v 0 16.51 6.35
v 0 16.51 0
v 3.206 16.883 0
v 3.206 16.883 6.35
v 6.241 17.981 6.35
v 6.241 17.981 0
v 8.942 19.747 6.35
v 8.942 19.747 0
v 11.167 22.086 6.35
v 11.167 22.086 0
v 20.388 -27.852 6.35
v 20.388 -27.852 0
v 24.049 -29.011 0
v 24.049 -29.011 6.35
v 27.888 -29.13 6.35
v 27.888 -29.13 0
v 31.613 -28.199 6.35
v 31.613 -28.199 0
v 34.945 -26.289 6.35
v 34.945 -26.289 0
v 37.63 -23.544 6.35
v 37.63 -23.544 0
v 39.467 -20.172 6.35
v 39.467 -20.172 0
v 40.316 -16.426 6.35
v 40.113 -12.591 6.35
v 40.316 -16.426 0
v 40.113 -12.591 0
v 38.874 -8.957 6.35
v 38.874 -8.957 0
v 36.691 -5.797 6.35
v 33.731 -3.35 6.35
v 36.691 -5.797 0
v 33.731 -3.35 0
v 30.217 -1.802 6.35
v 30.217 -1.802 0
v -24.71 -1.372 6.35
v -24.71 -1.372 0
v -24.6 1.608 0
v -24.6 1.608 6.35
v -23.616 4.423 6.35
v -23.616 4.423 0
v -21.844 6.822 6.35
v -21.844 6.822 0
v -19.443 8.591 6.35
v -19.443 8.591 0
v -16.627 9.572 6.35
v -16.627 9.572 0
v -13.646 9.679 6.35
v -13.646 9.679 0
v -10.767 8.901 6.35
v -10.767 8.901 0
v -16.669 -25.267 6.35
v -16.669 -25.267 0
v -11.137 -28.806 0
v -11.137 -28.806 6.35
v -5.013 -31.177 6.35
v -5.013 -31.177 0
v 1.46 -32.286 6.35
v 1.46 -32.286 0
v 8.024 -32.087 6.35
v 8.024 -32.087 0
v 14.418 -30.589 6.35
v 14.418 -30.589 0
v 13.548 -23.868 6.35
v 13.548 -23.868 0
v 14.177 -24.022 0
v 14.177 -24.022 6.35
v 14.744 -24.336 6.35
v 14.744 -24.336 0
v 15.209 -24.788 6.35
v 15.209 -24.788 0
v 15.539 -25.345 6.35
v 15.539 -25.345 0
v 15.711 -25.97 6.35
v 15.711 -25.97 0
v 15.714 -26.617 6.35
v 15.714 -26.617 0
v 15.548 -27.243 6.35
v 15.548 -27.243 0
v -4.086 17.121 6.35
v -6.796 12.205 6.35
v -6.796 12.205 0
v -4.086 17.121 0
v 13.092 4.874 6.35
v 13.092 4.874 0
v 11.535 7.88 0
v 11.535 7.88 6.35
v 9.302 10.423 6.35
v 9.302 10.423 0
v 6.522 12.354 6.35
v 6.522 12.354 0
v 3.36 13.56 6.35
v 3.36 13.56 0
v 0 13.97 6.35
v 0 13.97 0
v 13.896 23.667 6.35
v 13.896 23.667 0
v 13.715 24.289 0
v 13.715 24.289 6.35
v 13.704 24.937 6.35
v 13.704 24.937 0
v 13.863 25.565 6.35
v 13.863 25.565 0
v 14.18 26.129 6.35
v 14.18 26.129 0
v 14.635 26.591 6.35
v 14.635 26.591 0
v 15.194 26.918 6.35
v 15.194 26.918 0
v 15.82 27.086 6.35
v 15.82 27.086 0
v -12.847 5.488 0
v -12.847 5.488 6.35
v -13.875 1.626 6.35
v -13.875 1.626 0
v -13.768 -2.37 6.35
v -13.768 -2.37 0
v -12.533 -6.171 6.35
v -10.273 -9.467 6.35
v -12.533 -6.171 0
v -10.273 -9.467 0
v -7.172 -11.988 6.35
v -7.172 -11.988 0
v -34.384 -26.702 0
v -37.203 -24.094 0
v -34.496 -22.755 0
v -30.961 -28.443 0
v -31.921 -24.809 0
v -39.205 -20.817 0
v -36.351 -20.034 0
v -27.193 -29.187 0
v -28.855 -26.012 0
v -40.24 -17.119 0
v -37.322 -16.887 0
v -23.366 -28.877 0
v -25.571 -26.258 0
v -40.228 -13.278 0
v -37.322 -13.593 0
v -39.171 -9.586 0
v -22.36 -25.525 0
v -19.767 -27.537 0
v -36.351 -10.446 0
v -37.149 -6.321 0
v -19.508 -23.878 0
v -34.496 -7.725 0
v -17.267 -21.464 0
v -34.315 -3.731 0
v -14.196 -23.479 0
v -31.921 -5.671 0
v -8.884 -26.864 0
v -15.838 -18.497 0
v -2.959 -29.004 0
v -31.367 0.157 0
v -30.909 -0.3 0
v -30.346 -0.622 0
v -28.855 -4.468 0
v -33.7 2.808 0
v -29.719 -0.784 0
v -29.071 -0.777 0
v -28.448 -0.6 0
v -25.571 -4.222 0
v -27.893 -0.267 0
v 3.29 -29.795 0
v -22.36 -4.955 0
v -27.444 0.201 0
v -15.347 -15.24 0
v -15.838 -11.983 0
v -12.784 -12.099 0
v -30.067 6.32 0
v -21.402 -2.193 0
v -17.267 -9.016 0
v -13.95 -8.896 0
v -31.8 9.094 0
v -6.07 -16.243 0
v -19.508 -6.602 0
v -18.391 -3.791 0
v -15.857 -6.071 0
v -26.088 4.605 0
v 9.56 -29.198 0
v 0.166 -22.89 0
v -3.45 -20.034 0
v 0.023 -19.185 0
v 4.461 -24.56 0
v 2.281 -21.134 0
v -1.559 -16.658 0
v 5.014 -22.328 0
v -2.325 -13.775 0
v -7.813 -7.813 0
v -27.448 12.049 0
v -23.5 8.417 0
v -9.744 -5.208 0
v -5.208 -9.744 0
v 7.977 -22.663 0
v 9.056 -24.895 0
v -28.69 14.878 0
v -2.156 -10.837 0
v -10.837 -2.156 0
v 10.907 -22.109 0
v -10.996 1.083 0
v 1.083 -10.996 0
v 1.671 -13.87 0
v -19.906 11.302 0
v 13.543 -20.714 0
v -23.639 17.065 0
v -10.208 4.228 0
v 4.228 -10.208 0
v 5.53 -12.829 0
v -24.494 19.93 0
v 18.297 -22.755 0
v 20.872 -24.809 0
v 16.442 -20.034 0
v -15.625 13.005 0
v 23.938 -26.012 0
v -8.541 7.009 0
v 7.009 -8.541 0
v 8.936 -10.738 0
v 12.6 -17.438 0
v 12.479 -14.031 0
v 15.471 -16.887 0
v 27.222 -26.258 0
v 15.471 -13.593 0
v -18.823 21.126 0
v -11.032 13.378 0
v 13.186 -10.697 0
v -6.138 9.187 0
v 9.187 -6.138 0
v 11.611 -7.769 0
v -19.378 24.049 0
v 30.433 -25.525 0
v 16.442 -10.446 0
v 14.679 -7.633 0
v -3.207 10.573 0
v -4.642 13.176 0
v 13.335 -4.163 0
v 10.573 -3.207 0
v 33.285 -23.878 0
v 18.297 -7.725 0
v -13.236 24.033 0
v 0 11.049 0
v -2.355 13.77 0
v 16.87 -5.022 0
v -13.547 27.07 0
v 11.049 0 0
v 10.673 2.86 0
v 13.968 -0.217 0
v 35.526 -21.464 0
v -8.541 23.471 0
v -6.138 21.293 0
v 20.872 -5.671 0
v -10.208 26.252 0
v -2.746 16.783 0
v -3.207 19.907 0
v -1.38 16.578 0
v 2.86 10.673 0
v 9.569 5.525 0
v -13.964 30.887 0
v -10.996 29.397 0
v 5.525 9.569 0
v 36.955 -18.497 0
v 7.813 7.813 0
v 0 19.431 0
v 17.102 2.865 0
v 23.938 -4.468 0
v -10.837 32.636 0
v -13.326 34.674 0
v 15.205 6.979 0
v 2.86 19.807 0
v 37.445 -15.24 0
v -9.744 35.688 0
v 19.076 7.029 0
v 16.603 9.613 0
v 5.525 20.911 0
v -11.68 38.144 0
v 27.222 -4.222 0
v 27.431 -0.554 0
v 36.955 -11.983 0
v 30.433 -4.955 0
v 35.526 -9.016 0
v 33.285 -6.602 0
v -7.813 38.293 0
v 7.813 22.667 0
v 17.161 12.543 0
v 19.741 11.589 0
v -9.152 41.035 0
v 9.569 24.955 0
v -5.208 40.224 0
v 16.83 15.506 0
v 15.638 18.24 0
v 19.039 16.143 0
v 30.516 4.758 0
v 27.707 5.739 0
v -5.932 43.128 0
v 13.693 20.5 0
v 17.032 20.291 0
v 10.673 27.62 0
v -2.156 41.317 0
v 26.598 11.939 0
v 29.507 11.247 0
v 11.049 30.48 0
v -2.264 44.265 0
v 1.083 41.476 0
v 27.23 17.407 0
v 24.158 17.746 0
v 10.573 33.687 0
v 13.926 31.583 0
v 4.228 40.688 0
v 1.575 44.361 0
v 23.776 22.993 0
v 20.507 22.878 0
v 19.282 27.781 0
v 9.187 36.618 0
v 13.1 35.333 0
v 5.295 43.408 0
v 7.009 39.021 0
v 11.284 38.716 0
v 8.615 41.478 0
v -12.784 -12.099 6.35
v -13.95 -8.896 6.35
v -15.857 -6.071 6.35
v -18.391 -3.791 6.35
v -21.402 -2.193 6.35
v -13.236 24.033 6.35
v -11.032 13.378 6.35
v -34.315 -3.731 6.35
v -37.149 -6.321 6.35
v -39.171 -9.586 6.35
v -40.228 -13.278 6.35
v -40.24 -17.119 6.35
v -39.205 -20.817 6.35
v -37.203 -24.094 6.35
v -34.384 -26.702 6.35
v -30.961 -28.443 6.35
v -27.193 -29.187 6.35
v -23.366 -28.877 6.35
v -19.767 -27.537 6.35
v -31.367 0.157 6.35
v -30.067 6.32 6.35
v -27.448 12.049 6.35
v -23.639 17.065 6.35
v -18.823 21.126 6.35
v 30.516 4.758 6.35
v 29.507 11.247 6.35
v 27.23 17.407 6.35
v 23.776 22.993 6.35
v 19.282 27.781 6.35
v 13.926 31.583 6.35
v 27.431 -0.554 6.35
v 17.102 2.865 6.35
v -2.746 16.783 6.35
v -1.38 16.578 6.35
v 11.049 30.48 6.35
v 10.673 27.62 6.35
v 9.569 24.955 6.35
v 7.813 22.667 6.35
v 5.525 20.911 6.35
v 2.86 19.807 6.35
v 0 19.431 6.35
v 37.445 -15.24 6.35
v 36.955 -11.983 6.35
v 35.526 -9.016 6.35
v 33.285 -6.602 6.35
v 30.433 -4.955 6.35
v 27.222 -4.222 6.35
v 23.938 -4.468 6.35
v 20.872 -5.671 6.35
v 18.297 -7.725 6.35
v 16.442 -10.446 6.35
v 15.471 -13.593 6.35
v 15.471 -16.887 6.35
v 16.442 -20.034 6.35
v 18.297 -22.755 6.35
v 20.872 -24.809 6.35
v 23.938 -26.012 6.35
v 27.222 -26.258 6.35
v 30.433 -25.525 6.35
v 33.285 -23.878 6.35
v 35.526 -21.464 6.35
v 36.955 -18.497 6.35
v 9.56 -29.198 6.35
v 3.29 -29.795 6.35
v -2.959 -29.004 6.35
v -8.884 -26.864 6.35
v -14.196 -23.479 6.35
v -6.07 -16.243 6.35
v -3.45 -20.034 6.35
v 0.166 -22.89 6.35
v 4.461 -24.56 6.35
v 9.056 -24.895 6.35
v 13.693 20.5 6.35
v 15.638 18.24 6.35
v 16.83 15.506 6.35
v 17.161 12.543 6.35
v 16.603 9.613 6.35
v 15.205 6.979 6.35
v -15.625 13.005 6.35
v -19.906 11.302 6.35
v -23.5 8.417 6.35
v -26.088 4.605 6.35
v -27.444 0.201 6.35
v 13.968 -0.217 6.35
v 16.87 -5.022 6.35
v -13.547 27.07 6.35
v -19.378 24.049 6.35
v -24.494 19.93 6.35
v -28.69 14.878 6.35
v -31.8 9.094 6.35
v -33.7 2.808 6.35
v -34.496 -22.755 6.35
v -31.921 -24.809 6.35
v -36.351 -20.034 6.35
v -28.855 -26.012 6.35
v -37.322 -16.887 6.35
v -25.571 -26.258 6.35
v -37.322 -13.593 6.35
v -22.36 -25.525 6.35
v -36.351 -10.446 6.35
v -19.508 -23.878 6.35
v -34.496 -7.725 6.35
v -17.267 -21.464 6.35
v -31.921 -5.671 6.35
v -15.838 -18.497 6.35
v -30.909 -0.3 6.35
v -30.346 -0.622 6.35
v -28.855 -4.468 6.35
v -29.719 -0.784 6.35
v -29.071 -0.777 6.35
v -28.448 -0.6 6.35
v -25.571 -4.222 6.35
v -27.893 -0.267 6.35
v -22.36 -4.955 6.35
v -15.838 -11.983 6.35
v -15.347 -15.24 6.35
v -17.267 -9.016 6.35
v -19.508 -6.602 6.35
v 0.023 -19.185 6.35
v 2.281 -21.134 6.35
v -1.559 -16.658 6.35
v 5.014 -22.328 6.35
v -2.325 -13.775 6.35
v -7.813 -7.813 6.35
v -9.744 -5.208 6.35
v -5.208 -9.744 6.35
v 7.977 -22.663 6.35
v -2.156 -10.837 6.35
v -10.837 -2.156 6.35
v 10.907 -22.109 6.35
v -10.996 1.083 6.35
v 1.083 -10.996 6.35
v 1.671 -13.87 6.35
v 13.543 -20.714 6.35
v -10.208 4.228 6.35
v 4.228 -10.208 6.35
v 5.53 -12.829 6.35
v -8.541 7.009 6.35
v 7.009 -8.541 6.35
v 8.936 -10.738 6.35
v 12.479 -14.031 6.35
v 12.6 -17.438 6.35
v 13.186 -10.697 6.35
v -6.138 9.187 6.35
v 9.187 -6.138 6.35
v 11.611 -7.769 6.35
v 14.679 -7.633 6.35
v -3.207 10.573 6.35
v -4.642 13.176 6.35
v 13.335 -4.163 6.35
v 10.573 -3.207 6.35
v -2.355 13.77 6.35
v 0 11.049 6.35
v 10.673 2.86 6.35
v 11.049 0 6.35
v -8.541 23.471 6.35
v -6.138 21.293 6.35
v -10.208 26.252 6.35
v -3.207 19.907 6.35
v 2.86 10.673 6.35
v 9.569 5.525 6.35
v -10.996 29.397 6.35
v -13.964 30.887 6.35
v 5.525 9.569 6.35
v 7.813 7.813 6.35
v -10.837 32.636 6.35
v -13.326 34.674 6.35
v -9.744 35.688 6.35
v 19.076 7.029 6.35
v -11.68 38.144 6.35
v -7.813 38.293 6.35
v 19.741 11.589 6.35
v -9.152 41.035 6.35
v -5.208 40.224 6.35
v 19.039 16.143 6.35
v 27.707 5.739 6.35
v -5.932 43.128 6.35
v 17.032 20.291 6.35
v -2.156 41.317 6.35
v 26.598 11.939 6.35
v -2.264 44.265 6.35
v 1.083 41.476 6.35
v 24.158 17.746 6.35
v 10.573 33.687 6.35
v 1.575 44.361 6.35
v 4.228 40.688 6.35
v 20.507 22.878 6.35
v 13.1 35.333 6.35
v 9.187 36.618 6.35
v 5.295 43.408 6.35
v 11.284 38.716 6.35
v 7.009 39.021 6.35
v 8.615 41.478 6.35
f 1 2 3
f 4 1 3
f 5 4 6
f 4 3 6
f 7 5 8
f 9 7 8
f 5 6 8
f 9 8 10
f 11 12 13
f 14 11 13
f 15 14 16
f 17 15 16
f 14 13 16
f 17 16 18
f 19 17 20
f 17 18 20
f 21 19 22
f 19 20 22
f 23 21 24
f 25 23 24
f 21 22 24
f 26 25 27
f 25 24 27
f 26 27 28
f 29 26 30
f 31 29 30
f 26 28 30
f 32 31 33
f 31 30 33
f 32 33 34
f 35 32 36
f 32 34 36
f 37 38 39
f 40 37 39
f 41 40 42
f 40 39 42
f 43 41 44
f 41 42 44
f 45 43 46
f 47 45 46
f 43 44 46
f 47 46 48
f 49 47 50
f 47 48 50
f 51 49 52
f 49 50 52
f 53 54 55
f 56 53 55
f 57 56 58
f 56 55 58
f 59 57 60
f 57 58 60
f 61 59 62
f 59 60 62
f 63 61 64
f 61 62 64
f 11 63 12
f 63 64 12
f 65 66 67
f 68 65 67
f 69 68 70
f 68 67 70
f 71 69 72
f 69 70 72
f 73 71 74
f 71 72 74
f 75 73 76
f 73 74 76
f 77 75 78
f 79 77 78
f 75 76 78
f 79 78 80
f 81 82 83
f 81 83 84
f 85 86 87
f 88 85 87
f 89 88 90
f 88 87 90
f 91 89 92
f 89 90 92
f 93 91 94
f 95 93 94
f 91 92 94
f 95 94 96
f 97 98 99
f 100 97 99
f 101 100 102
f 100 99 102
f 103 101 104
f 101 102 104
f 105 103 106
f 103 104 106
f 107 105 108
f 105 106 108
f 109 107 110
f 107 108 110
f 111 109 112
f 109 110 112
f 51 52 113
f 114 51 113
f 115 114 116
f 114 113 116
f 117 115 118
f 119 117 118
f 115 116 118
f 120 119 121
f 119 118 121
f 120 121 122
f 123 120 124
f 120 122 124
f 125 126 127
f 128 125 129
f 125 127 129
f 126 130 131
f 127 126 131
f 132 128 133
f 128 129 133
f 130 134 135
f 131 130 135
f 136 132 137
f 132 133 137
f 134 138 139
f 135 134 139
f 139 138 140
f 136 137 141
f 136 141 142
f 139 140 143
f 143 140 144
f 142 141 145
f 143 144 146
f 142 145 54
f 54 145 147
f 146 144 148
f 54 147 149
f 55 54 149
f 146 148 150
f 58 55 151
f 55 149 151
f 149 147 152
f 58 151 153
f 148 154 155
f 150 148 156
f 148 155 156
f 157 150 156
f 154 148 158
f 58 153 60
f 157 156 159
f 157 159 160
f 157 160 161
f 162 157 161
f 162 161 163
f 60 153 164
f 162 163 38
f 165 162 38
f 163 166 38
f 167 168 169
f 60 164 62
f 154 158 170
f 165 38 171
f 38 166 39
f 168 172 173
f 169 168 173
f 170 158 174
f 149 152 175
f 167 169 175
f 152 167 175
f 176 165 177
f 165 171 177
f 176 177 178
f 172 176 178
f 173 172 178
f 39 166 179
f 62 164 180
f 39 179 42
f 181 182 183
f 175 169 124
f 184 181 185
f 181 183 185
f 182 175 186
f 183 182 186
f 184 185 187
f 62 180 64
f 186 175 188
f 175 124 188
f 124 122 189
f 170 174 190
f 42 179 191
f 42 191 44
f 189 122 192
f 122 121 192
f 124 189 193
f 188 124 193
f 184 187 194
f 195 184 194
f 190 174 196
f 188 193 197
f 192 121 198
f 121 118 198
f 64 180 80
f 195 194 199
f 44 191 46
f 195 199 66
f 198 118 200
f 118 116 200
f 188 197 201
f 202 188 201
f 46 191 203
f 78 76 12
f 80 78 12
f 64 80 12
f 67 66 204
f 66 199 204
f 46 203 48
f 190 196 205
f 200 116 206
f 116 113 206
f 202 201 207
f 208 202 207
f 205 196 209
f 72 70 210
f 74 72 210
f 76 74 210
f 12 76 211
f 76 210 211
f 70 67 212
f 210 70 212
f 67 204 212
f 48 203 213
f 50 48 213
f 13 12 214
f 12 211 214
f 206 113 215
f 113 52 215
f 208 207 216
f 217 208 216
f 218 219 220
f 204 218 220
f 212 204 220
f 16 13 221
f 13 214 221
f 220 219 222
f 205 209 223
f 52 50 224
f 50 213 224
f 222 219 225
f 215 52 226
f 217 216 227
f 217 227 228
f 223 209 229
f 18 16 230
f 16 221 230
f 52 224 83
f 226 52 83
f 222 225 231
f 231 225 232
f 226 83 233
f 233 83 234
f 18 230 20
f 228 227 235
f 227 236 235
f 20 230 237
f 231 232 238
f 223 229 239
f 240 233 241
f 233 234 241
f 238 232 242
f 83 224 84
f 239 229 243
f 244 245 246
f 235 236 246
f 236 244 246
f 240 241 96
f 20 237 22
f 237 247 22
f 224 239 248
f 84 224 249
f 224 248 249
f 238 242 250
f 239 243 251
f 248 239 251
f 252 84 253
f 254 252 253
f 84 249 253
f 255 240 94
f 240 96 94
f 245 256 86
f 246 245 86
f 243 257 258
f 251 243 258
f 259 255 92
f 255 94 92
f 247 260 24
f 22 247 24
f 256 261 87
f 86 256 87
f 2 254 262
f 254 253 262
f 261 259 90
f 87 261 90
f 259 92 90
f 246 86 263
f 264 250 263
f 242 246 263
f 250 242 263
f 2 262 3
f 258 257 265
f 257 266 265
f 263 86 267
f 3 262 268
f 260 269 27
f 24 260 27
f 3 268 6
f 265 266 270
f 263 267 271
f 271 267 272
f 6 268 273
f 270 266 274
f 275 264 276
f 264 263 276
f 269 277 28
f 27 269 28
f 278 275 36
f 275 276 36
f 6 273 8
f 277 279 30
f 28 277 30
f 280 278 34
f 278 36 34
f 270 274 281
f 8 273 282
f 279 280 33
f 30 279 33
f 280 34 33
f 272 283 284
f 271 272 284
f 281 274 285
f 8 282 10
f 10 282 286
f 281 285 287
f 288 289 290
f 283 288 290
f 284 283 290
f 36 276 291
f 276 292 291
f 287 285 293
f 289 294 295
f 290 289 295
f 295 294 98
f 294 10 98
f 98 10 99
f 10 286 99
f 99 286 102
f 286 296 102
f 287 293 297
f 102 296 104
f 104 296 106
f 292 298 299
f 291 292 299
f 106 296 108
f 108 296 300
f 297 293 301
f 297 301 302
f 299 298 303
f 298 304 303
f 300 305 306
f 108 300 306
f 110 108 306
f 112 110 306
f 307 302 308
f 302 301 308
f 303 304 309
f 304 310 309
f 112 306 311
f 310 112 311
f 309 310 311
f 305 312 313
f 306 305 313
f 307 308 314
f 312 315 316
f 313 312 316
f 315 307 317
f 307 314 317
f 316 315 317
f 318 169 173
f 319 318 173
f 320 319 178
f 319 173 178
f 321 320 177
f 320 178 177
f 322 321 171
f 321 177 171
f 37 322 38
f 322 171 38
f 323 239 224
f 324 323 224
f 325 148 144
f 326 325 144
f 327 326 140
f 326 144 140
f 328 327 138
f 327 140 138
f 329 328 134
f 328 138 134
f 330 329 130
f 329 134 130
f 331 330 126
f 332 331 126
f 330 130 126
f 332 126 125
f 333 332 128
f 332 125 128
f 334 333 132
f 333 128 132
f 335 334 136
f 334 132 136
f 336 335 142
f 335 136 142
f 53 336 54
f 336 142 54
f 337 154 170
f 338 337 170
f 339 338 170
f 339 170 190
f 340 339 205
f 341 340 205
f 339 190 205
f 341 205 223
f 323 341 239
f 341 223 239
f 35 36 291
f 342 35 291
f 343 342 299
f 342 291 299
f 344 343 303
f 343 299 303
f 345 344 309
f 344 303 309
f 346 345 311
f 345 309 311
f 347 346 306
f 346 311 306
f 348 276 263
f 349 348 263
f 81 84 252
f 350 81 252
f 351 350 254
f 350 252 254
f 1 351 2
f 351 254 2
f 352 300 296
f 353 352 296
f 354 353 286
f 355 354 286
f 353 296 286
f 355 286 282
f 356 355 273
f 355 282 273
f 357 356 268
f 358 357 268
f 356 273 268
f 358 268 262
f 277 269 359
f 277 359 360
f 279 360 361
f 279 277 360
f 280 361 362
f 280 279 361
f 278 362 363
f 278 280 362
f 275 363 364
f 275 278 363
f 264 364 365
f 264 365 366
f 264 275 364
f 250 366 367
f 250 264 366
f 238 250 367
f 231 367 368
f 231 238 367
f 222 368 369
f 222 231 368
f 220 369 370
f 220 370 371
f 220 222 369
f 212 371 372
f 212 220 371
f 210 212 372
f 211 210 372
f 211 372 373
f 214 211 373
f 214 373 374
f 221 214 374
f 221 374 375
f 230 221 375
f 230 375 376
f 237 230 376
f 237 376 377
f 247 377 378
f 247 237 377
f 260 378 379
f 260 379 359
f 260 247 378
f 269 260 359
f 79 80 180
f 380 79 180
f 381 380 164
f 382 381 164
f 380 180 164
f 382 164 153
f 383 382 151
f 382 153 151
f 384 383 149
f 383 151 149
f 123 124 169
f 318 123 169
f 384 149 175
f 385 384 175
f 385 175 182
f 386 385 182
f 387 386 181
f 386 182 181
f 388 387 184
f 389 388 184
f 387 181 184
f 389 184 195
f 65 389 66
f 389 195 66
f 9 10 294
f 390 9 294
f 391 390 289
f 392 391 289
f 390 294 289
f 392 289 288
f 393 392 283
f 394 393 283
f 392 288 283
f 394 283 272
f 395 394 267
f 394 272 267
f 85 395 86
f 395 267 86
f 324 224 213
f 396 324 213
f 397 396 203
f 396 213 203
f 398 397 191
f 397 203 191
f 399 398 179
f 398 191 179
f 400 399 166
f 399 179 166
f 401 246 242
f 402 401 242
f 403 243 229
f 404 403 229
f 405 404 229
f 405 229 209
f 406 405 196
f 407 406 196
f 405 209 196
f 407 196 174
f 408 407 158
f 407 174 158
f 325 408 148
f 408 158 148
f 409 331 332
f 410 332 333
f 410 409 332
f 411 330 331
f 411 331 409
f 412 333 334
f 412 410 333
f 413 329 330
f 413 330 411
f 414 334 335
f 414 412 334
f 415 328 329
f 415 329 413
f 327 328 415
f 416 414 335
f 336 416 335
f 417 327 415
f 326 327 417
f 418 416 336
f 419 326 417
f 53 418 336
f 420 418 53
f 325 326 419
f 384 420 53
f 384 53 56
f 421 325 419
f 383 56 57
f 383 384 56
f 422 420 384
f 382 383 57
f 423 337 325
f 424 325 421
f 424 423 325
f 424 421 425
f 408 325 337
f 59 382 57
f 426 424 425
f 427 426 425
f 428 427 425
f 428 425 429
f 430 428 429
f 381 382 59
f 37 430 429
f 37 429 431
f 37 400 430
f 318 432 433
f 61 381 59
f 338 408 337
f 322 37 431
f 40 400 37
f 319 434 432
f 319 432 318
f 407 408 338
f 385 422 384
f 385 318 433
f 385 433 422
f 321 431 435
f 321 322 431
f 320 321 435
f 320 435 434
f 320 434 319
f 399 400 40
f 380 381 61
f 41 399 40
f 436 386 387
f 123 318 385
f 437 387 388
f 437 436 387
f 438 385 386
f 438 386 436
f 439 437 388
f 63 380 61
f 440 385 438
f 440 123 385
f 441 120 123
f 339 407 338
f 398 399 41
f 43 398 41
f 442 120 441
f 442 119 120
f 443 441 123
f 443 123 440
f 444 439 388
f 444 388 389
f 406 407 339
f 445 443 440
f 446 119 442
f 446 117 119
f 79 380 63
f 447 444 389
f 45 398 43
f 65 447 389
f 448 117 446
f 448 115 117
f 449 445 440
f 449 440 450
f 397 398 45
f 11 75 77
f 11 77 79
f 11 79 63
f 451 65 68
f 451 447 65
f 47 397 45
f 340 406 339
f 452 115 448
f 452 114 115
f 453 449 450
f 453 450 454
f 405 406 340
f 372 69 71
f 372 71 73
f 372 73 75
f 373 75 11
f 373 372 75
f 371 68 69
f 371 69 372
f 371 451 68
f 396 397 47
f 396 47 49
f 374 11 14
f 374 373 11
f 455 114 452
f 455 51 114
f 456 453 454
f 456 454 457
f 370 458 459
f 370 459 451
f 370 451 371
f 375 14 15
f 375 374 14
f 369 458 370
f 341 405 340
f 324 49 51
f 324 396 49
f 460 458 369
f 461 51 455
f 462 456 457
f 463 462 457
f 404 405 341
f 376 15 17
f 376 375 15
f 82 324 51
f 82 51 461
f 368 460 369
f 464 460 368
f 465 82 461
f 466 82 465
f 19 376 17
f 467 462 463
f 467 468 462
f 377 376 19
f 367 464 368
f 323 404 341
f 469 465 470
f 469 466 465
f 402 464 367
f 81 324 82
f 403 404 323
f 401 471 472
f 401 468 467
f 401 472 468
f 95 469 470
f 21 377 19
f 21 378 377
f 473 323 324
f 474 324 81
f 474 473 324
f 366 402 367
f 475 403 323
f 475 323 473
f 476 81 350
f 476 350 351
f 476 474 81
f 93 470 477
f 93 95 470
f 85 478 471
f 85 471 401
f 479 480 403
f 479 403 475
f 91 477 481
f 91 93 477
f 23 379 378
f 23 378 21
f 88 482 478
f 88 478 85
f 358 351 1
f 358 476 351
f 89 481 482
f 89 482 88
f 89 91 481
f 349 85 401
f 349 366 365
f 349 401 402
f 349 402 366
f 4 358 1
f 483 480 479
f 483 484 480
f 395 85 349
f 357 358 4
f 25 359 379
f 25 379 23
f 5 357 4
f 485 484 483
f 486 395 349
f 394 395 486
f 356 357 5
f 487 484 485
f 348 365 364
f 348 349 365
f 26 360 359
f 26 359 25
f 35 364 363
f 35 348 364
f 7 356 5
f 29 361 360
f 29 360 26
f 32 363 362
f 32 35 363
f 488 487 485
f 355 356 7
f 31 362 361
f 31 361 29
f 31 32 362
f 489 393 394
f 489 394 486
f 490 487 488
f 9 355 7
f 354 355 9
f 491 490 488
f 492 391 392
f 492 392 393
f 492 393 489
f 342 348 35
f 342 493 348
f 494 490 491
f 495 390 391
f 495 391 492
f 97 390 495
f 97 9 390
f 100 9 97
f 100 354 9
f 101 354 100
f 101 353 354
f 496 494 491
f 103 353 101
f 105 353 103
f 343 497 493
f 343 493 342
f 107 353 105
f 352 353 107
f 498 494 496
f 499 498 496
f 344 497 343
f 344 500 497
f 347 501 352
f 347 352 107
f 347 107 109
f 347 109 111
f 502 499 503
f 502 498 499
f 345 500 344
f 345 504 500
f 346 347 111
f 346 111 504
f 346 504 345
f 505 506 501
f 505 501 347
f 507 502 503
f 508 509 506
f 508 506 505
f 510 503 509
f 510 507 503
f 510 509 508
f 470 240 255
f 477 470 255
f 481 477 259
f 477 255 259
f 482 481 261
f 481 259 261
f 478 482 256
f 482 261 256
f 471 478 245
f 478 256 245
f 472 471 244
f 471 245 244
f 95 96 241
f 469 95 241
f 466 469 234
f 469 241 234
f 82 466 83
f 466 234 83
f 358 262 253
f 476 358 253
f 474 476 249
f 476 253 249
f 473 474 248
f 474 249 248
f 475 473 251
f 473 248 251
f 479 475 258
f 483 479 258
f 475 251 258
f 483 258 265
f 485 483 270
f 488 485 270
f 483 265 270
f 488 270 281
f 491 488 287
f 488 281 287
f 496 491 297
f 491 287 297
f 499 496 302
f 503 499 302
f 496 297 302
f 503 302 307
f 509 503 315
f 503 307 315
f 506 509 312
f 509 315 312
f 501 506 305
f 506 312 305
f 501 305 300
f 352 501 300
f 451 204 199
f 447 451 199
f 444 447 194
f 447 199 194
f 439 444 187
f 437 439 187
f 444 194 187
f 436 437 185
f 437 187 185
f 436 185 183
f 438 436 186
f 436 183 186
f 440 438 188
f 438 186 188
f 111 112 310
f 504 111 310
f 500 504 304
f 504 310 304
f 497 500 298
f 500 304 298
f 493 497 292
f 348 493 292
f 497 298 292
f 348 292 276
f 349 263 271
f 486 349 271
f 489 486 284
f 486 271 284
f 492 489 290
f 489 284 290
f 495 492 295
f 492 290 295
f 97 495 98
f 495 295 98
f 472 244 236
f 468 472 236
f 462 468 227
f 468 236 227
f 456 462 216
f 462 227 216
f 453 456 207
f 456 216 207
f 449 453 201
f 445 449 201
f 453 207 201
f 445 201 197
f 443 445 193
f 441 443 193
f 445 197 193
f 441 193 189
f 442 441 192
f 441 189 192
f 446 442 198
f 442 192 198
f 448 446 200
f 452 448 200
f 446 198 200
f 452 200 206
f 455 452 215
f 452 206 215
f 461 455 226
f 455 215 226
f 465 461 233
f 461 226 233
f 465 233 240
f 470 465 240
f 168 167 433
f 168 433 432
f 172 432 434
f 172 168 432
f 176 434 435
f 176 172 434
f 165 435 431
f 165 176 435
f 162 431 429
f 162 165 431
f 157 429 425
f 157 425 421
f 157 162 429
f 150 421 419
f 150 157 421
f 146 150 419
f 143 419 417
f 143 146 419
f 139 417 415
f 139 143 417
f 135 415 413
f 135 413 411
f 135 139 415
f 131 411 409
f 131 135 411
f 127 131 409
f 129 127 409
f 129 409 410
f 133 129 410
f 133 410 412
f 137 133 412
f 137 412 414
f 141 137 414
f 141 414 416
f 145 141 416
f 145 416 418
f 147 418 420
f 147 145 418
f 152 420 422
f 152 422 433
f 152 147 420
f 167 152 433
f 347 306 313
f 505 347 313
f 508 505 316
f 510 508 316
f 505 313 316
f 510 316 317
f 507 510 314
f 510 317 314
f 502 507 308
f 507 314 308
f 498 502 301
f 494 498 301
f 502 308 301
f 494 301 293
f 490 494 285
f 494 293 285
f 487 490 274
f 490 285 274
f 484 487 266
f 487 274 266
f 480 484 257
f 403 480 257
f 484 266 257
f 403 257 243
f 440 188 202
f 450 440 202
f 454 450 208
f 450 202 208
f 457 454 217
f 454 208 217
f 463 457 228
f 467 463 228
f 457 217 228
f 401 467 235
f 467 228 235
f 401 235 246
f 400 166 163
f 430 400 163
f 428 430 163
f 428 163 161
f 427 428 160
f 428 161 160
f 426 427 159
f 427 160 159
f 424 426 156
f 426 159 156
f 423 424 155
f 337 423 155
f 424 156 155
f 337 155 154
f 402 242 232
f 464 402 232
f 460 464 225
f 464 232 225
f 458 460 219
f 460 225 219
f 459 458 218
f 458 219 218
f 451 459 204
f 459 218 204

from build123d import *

# Parameters (mm, degrees)
F0_R     = 11.049
F1_DEPTH = 6.35


with BuildPart() as f1:
    # F0 (on Top) → F1 (new body)
    with BuildSketch(Plane.XY):
        with BuildLine():
            ThreePointArc((0, 11.049), (-7.812823, -7.812823), (11.049, 0))
            ThreePointArc((11.049, 0), (7.812823, 7.812823), (0, 11.049))
        make_face()
        with BuildLine():
            ThreePointArc((11.049, 30.48), (-7.812823, 38.292823), (0, 19.431))
            ThreePointArc((0, 19.431), (7.812823, 22.667177), (11.049, 30.48))
        make_face()
        with BuildLine():
            ThreePointArc((20.388099, -27.851922), (39.467067, -20.17153), (30.216541, -1.802447))
            ThreePointArc((30.216541, -1.802447), (27.230144, 17.407217), (13.926422, 31.582573))
            ThreePointArc((13.926422, 31.582573), (-2.264476, 44.265247), (-13.547306, 27.069516))
            ThreePointArc((-13.547306, 27.069516), (-28.690164, 14.878388), (-34.314522, -3.730651))
            ThreePointArc((-34.314522, -3.730651), (-37.202591, -24.093718), (-16.669235, -25.267069))
            ThreePointArc((-16.669235, -25.267069), (1.46002, -32.285604), (20.388099, -27.851922))
        make_face()
        with Locations((-26.396454, -15.24)):
            Circle(F0_R, mode=Mode.SUBTRACT)
        with BuildLine():
            ThreePointArc((-24.710147, -1.37215), (-20.709724, 7.796596), (-10.767389, 8.9008))
            ThreePointArc((-10.767389, 8.9008), (-13.767563, -2.369623), (-7.172004, -11.988463))
            Line((-7.172004, -11.988463), (-12.78411, -12.099142))
            ThreePointArc((-12.78411, -12.099142), (-17.054117, -4.853392), (-24.710147, -1.37215))
        make_face(mode=Mode.SUBTRACT)
        with BuildLine():
            ThreePointArc((13.548183, -23.867834), (15.3921, -25.055532), (15.5478, -27.24332))
            ThreePointArc((15.5478, -27.24332), (0.143167, -29.572149), (-14.195671, -23.479213))
            Line((-14.195671, -23.479213), (-6.069518, -16.243227))
            ThreePointArc((-6.069518, -16.243227), (2.250939, -23.885085), (13.548183, -23.867834))
        make_face(mode=Mode.SUBTRACT)
        with Locations((26.396454, -15.24)):
            Circle(F0_R, mode=Mode.SUBTRACT)
        with BuildLine():
            Line((13.968316, -0.216906), (16.870219, -5.021793))
            ThreePointArc((16.870219, -5.021793), (12.730219, -12.342602), (13.54339, -20.71354))
            ThreePointArc((13.54339, -20.71354), (3.602811, -21.833445), (-2.324624, -13.775232))
            ThreePointArc((-2.324624, -13.775232), (8.935935, -10.738248), (13.968316, -0.216906))
        make_face(mode=Mode.SUBTRACT)
        with BuildLine():
            ThreePointArc((0, 11.049), (7.812823, 7.812823), (11.049, 0))
            ThreePointArc((11.049, 0), (-7.812823, -7.812823), (0, 11.049))
        make_face(mode=Mode.SUBTRACT)
        with BuildLine():
            ThreePointArc((-27.444242, 0.200847), (-29.394777, -0.802184), (-31.367307, 0.15687))
            ThreePointArc((-31.367307, 0.15687), (-25.681816, 14.662088), (-13.235759, 24.033418))
            Line((-13.235759, 24.033418), (-11.032288, 13.37797))
            ThreePointArc((-11.032288, 13.37797), (-21.81056, 9.993172), (-27.444242, 0.200847))
        make_face(mode=Mode.SUBTRACT)
        with BuildLine():
            ThreePointArc((13.092013, 4.874432), (7.97073, 11.47294), (0, 13.97))
            ThreePointArc((0, 13.97), (-3.510832, 13.521648), (-6.796312, 12.20537))
            Line((-6.796312, 12.20537), (-4.086109, 17.120935))
            ThreePointArc((-4.086109, 17.120935), (-2.065764, 16.663578), (0, 16.51))
            ThreePointArc((0, 16.51), (6.240688, 17.981412), (11.166757, 22.08569))
            ThreePointArc((11.166757, 22.08569), (17.106913, 14.036849), (13.092013, 4.874432))
        make_face(mode=Mode.SUBTRACT)
        with BuildLine():
            ThreePointArc((13.896059, 23.666987), (14.002677, 25.857716), (15.819507, 27.08645))
            ThreePointArc((15.819507, 27.08645), (25.538649, 14.910061), (27.43143, -0.554205))
            Line((27.43143, -0.554205), (17.101806, 2.865257))
            ThreePointArc((17.101806, 2.865257), (19.559621, 13.891913), (13.896059, 23.666987))
        make_face(mode=Mode.SUBTRACT)
        with BuildLine():
            ThreePointArc((11.049, 30.48), (7.812823, 22.667177), (0, 19.431))
            ThreePointArc((0, 19.431), (-7.812823, 38.292823), (11.049, 30.48))
        make_face(mode=Mode.SUBTRACT)
    extrude(amount=F1_DEPTH)


solid = f1.part
